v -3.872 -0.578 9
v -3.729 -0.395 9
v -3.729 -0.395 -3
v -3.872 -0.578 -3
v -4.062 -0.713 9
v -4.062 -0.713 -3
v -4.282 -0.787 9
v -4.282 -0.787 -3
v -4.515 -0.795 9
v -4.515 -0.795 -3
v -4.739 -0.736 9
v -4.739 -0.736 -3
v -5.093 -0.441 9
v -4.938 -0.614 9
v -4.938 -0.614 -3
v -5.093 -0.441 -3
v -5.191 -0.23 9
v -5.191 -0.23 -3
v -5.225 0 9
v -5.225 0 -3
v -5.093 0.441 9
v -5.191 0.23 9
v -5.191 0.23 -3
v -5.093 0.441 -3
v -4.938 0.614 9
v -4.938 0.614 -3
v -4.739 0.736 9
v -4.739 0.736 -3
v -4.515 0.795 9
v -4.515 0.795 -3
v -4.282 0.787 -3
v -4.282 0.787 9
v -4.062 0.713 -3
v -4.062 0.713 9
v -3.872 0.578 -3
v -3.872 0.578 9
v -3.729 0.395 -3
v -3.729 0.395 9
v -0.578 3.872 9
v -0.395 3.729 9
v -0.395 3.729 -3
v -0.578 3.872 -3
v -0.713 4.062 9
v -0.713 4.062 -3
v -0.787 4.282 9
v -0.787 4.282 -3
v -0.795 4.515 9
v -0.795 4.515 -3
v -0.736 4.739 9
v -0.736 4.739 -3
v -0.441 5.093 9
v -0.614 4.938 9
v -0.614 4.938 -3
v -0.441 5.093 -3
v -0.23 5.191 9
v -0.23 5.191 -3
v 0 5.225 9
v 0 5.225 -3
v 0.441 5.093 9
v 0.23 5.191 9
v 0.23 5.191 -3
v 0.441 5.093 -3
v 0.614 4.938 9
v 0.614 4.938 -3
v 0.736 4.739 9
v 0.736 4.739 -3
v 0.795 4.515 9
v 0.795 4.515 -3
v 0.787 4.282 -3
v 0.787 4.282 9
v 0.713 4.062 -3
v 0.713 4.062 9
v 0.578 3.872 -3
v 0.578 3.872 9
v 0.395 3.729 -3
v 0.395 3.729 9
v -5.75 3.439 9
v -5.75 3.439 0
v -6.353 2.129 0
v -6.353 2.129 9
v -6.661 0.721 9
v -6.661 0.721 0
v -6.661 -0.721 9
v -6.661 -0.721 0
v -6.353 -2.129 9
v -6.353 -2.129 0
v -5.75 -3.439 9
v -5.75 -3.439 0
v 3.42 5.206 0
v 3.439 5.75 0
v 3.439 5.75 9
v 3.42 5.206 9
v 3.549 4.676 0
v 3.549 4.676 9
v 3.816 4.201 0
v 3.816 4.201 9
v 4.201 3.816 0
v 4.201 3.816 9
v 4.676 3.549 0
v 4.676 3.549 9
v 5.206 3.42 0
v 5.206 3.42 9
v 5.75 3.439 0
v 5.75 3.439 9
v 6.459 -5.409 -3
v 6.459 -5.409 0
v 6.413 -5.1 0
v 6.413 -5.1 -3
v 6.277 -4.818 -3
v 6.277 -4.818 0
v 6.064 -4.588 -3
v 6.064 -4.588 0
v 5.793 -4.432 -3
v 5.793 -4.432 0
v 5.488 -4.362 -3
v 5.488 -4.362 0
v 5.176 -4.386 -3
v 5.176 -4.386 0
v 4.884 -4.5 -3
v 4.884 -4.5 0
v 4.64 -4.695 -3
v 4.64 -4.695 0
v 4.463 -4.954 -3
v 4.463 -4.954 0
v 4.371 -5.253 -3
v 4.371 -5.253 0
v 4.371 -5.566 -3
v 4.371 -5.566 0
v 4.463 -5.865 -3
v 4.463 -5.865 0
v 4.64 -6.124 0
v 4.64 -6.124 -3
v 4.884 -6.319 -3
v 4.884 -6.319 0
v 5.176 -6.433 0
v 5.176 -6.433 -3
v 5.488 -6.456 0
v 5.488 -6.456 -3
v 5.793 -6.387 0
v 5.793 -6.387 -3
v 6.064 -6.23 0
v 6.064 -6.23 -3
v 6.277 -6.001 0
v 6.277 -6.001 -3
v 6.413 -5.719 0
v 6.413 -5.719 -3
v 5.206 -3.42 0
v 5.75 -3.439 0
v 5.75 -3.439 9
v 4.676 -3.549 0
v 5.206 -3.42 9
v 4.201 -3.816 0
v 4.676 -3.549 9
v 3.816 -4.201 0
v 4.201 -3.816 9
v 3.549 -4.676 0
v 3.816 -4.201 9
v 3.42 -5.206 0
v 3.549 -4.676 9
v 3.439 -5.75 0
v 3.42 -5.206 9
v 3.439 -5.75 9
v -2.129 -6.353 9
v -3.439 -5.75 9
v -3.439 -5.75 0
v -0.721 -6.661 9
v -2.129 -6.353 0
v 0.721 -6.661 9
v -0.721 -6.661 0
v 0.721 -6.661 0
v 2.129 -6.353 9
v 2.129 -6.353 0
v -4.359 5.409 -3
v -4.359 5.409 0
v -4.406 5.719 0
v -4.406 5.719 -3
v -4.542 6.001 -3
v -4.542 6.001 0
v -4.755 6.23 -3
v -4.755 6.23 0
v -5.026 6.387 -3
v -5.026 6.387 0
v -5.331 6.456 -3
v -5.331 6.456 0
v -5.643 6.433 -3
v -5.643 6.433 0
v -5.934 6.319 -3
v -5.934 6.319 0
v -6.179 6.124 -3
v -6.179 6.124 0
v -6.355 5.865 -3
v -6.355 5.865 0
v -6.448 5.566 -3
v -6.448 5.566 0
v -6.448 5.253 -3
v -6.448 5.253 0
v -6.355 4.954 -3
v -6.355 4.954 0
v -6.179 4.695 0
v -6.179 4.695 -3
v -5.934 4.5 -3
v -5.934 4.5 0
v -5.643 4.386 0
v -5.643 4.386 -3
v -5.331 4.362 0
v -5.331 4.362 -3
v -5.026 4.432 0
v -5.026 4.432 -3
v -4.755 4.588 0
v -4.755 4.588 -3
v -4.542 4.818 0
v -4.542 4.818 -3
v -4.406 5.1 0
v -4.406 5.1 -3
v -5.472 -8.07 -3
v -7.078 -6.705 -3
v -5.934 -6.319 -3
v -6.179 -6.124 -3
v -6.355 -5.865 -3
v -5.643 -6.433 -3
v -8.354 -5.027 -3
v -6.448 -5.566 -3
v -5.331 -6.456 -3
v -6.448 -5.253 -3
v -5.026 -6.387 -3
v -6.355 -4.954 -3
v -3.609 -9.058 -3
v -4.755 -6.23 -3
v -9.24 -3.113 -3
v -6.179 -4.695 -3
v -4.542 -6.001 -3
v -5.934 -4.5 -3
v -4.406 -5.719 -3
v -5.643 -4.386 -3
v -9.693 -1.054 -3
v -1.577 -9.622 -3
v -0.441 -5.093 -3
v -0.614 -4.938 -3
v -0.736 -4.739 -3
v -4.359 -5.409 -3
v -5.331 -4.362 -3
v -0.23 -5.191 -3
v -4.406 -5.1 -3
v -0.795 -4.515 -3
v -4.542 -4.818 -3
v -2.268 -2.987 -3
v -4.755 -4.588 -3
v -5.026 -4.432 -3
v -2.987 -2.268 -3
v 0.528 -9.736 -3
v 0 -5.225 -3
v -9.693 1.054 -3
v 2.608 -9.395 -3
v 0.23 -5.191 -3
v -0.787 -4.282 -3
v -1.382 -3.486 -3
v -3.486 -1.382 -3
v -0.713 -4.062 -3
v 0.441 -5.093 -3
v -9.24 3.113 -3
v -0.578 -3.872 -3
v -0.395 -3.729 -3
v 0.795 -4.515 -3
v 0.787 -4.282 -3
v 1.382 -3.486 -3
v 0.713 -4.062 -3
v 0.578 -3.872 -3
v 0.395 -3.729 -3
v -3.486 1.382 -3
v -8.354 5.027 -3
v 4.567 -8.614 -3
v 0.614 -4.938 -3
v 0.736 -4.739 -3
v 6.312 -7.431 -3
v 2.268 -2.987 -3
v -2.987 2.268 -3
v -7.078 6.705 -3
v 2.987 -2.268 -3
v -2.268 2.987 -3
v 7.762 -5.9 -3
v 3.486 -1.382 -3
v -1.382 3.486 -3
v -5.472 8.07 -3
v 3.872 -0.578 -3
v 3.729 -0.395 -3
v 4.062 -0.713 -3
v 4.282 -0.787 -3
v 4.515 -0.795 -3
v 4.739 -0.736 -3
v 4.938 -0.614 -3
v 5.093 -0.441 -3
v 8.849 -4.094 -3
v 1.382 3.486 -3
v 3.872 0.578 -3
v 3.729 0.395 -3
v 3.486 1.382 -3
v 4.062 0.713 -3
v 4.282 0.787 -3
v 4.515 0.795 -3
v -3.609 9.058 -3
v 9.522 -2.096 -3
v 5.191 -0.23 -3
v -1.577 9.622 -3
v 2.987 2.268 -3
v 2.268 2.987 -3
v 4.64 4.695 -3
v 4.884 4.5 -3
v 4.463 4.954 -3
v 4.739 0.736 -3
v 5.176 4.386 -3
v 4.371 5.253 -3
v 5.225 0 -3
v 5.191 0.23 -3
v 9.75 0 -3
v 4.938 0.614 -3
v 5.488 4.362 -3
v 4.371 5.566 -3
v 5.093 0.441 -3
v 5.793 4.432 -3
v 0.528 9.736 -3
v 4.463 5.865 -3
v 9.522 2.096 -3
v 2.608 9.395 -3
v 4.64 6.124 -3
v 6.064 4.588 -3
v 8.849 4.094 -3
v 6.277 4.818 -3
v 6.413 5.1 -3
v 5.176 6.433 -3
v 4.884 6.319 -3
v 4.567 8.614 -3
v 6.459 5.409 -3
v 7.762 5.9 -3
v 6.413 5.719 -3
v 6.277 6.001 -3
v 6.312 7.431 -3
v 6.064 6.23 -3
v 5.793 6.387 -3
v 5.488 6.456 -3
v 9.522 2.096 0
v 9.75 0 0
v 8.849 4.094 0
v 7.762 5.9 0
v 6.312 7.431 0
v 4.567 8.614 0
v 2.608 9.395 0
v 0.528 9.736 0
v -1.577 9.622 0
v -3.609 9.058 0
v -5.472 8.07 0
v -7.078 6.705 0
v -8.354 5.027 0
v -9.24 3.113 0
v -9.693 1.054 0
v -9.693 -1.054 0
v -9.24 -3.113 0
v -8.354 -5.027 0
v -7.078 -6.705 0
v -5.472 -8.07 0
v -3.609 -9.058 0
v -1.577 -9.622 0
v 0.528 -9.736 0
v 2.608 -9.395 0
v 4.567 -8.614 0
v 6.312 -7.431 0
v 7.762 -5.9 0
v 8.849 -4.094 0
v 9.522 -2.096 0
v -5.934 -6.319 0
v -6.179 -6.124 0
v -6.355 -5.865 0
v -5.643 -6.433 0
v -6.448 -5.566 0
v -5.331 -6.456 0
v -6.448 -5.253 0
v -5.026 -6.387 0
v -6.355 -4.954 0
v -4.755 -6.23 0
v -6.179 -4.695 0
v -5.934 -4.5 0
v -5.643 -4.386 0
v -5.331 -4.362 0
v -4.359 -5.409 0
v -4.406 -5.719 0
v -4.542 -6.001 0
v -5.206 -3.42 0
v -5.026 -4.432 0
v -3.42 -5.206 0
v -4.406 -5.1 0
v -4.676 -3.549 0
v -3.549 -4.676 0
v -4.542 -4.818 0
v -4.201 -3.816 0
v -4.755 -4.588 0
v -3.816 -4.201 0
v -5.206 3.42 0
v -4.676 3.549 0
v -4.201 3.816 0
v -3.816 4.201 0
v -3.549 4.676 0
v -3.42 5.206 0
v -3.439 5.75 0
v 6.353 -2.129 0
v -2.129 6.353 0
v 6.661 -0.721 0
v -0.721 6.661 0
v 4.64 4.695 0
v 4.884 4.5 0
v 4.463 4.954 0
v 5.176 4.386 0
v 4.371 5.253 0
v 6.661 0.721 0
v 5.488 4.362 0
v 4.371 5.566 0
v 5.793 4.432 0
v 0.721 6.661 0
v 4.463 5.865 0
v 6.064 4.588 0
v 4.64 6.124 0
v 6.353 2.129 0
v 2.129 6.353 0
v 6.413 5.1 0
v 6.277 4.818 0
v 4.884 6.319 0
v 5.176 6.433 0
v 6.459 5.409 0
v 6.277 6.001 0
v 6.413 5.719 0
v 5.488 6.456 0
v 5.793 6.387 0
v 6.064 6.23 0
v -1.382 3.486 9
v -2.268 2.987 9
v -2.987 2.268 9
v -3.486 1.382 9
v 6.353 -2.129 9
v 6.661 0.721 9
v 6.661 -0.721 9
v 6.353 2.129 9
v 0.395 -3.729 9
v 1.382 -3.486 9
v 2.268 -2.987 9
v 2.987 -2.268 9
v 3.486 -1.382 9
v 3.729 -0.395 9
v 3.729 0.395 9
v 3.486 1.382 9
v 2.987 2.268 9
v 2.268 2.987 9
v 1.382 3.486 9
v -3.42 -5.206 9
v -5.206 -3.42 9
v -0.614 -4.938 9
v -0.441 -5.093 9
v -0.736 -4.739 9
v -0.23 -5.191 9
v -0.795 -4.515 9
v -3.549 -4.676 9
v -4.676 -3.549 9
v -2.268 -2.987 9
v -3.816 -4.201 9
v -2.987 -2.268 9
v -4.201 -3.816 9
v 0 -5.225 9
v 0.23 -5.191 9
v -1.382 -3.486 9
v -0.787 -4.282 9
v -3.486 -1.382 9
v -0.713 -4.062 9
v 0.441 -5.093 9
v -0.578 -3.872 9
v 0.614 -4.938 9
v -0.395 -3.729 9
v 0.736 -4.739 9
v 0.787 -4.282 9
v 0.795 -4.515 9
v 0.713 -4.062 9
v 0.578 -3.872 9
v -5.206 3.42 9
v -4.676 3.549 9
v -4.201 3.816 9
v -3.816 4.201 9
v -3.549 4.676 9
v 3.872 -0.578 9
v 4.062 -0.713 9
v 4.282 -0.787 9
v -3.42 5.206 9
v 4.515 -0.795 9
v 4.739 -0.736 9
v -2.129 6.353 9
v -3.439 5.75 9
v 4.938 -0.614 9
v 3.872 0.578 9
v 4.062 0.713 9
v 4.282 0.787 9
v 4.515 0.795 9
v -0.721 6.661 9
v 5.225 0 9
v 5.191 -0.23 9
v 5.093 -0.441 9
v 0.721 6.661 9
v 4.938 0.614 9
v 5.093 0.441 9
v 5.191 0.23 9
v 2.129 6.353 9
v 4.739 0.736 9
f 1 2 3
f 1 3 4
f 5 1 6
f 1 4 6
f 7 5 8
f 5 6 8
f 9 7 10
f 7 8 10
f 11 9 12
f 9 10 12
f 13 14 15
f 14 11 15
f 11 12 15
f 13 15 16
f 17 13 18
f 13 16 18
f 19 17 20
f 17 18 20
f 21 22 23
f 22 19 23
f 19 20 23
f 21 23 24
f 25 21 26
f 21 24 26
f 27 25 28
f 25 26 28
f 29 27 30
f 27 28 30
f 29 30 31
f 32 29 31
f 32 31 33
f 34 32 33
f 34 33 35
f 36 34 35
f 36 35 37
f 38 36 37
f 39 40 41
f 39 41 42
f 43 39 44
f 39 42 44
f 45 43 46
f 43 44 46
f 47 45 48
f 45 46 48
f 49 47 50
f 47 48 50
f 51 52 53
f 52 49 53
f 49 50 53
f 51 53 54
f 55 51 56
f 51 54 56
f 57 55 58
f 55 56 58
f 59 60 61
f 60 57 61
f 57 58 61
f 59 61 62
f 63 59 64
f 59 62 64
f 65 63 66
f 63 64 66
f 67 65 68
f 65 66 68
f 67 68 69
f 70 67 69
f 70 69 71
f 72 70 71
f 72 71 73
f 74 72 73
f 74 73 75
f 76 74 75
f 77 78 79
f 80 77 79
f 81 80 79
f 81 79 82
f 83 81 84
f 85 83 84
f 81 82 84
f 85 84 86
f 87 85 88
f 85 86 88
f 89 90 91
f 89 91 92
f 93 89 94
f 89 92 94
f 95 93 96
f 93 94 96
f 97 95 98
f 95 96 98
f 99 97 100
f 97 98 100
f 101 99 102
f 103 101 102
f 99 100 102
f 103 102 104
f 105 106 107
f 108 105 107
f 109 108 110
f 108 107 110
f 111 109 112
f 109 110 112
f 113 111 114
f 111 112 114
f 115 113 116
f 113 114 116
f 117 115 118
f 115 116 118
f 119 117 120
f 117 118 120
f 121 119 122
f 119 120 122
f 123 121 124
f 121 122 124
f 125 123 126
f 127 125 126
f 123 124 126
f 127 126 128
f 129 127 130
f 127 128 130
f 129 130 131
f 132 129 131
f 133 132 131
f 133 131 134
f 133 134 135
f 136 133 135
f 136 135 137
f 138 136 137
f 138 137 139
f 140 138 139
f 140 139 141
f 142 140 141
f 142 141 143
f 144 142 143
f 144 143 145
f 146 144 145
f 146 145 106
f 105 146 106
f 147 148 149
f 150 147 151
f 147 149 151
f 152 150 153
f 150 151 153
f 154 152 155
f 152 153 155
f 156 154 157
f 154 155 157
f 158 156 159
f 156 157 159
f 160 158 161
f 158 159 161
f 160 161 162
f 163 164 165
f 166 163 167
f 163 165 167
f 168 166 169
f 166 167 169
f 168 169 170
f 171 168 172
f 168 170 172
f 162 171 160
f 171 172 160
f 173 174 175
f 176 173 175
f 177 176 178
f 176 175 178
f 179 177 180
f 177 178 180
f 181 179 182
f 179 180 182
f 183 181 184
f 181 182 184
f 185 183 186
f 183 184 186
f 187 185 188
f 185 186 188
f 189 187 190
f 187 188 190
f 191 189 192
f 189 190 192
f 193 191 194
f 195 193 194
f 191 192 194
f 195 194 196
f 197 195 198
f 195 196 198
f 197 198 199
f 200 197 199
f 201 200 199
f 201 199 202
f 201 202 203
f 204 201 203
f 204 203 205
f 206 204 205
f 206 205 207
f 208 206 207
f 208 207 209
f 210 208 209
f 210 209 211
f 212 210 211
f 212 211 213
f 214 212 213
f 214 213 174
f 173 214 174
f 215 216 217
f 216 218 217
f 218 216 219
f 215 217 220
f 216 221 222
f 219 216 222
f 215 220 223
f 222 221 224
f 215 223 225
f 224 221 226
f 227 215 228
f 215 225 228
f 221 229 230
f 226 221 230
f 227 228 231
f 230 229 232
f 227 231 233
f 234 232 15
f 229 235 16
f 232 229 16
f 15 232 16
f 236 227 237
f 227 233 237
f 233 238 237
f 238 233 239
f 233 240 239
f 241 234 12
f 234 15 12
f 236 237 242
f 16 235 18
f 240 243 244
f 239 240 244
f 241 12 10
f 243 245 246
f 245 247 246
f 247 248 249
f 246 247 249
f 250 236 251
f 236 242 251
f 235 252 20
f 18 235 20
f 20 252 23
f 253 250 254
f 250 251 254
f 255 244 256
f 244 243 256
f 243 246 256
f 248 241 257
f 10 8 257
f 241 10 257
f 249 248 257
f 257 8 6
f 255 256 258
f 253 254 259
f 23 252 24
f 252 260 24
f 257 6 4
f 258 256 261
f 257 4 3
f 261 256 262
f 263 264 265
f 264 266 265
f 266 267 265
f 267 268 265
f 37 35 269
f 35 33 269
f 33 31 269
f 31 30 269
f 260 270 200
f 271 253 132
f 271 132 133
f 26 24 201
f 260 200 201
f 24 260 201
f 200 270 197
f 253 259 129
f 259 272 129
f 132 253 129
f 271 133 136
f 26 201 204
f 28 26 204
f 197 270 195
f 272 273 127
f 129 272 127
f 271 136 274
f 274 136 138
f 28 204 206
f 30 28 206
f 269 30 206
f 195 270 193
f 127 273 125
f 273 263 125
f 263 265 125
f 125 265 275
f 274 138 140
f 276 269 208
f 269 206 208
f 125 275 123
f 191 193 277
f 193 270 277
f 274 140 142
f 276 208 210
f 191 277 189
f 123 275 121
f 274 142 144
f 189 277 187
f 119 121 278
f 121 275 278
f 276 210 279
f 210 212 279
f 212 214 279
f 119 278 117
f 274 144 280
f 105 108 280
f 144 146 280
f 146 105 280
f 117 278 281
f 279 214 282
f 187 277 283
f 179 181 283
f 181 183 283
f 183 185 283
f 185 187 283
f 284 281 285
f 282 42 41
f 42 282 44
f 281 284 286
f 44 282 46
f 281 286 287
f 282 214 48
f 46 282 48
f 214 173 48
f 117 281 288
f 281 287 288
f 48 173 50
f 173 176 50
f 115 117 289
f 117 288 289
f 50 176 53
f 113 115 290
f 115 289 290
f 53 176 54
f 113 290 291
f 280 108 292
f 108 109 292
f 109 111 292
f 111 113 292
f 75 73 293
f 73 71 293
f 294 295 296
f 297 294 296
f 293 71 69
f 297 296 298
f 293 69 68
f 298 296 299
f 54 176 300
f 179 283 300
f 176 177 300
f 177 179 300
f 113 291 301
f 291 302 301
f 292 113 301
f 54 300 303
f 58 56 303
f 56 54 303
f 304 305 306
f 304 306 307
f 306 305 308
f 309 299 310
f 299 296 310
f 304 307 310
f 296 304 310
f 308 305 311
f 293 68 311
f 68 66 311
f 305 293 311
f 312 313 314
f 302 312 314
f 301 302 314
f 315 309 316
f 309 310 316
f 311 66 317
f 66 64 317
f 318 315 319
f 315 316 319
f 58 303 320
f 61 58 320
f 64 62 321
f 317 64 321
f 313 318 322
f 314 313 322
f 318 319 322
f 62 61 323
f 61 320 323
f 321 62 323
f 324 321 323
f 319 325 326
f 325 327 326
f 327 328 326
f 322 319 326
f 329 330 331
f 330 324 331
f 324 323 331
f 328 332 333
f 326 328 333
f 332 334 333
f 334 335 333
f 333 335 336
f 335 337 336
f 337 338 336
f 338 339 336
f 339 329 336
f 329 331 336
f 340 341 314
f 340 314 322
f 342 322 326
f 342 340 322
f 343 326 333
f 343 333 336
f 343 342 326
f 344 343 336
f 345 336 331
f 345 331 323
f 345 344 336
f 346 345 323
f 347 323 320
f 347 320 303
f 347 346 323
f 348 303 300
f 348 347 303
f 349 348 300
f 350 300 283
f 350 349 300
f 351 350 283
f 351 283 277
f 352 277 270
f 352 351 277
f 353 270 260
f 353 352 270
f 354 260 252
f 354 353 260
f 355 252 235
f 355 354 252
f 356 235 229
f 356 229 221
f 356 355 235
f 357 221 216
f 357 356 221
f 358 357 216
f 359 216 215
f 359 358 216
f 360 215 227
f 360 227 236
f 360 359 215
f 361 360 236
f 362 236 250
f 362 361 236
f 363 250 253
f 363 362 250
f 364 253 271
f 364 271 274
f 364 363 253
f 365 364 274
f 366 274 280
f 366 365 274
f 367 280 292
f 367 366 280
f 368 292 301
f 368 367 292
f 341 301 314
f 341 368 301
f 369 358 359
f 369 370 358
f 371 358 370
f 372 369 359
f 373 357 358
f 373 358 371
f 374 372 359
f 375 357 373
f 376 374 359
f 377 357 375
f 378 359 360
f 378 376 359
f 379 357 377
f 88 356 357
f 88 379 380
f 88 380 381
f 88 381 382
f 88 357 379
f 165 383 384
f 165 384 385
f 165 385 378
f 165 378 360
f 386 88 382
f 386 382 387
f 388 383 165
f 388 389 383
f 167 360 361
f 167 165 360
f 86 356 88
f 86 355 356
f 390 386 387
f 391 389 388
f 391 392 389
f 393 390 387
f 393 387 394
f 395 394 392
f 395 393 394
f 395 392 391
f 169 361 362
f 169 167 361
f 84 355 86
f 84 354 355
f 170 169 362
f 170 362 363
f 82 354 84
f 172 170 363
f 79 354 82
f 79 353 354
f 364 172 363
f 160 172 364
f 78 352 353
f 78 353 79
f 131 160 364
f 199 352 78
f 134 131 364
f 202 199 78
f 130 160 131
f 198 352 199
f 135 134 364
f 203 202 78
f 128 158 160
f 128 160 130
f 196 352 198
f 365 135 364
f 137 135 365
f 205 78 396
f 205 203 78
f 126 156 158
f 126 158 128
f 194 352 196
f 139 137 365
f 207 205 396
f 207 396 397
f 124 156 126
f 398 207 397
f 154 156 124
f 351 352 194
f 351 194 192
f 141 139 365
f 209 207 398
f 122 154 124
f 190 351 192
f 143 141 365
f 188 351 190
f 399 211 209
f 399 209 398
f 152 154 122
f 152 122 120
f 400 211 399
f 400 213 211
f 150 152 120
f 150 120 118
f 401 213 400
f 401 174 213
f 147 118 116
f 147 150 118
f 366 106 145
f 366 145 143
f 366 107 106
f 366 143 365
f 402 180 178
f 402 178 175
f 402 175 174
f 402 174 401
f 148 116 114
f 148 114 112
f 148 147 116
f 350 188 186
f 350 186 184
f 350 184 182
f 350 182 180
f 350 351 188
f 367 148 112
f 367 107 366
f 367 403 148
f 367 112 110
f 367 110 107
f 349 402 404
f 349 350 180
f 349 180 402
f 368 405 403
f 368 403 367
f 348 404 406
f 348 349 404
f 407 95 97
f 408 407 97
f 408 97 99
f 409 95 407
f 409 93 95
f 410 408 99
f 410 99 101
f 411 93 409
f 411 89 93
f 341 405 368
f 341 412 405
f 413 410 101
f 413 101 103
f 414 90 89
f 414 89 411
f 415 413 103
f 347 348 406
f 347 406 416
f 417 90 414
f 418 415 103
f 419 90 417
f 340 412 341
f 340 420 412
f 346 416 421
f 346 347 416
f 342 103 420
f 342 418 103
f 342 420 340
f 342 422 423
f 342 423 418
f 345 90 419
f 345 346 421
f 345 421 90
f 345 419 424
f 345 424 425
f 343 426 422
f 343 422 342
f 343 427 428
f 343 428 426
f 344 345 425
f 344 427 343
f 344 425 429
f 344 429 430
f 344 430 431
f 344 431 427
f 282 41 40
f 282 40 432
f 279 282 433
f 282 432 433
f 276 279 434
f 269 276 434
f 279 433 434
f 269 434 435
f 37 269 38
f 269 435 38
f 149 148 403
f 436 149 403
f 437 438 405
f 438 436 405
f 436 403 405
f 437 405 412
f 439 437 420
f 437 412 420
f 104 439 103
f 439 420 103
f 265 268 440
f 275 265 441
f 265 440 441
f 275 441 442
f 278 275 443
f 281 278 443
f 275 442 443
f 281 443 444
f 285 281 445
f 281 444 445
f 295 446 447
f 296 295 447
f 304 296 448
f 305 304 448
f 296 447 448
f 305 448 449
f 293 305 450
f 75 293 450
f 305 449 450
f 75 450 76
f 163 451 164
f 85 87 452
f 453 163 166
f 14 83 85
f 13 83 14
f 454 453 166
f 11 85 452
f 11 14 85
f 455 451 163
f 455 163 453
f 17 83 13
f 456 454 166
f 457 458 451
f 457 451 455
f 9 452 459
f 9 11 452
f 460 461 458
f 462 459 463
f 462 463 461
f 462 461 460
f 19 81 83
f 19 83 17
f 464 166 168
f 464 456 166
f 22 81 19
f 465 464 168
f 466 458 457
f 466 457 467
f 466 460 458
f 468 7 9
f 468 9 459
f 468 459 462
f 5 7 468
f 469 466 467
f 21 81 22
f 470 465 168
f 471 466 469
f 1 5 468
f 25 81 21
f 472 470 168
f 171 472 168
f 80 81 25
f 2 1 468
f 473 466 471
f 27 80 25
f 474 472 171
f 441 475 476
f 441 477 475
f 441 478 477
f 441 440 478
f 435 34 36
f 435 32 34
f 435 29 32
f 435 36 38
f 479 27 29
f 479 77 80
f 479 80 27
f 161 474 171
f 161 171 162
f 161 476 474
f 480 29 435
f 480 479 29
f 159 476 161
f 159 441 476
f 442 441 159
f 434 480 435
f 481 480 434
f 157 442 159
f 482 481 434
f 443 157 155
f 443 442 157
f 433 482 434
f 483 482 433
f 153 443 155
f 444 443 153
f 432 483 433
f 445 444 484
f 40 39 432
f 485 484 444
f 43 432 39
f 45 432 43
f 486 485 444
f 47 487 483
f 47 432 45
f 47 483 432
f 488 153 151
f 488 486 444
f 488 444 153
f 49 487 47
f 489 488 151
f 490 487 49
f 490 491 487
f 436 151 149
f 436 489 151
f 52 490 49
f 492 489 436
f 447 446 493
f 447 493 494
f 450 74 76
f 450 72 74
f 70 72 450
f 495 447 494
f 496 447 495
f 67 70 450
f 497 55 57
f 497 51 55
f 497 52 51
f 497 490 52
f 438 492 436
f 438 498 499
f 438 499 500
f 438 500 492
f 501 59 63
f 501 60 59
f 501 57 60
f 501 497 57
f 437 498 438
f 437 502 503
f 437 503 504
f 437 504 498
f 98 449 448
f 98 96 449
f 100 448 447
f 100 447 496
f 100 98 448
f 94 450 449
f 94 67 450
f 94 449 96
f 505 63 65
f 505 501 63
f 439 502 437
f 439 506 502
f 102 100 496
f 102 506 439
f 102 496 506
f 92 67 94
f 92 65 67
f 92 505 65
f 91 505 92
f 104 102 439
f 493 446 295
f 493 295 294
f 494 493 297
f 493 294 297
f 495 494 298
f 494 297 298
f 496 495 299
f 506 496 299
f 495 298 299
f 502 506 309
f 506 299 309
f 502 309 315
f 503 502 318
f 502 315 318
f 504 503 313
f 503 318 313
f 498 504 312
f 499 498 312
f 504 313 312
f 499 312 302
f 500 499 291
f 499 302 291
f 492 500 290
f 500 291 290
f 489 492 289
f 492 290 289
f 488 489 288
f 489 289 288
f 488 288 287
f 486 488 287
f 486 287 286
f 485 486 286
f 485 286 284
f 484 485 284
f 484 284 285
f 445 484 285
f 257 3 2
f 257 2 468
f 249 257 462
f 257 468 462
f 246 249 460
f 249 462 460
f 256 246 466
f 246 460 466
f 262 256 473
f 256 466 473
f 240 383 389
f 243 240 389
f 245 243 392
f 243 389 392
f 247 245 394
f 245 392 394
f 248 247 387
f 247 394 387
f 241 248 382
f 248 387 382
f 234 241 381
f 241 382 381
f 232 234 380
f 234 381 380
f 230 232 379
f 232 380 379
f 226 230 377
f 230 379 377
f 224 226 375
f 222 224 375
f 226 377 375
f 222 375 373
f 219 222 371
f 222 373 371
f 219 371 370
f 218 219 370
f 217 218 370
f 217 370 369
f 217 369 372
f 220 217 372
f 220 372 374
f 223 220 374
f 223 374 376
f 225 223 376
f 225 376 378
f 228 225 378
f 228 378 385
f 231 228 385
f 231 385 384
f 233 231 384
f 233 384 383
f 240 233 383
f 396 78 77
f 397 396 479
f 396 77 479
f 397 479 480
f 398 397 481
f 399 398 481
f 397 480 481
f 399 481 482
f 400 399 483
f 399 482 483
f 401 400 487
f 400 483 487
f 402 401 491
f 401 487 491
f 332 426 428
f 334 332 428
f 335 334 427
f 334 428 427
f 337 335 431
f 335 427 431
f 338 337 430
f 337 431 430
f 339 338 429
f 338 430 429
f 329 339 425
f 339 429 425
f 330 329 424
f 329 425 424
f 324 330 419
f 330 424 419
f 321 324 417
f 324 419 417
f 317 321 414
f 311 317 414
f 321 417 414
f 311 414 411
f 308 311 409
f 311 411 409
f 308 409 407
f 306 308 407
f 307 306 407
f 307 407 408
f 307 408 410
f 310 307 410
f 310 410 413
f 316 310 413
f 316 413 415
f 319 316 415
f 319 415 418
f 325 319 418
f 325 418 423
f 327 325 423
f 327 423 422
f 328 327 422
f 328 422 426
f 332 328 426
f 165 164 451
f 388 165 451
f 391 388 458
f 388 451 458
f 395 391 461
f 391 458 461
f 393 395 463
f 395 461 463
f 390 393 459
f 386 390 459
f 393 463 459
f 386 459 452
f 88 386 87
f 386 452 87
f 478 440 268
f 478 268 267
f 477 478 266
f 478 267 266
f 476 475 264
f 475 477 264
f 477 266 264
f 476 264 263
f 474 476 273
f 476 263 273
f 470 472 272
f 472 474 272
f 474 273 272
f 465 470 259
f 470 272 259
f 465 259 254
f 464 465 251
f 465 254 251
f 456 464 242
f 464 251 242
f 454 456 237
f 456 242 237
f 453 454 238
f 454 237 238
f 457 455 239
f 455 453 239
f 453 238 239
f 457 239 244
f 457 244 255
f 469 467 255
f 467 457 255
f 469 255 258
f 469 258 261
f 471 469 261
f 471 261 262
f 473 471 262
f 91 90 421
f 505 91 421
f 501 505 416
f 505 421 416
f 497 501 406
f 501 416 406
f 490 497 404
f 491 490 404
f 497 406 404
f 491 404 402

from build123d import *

# Parameters (mm, degrees)
SKIZZE1_R                       = 6.7
SKIZZE1_R_2                     = 3.75
AUFSATZ_LINEAR_AUSTRAGEN1_DEPTH = 9
SKIZZE1_7_R                     = 9.75
SKIZZE1_7_R_2                   = 3.75
AUFSATZ_LINEAR_AUSTRAGEN2_DEPTH = 3
M2_GEWINDEBOHRUNG1_D            = 1.6
SKIZZE5_R                       = 1.05
SCHNITT_LINEAR_AUSTRAGEN1_DEPTH = 13
SKIZZE5_3_R                     = 2
SKIZZE5_3_R_2                   = 1.05
SCHNITT_LINEAR_AUSTRAGEN2_DEPTH = 9


with BuildPart() as part:
    # Skizze1 → Aufsatz-Linear austragen1 (new body)
    with BuildSketch(Plane.XY):
        Circle(SKIZZE1_R)
        Circle(SKIZZE1_R_2, mode=Mode.SUBTRACT)
    extrude(amount=AUFSATZ_LINEAR_AUSTRAGEN1_DEPTH)

    # Skizze1<7> → Aufsatz-Linear austragen2 (add)
    with BuildSketch(Plane.XY):
        Circle(SKIZZE1_7_R)
        Circle(SKIZZE1_7_R_2, mode=Mode.SUBTRACT)
    extrude(amount=-AUFSATZ_LINEAR_AUSTRAGEN2_DEPTH)

    # M2 Gewindebohrung1 (through all)
    with Locations(Plane.XY.offset(9)):
        with Locations((4.425, 0), (0, -4.425), (-4.425, 0), (0, 4.425)):
            Hole(M2_GEWINDEBOHRUNG1_D / 2)

    # Skizze5 → Schnitt-Linear austragen1 (cut, through all)
    with BuildSketch(Plane.XY.offset(9)):
        with Locations((5.409366876, 5.409366876)):
            Circle(SKIZZE5_R)
        with Locations((5.409366876, -5.409366876)):
            Circle(SKIZZE5_R)
        with Locations((-5.409366876, -5.409366876)):
            Circle(SKIZZE5_R)
        with Locations((-5.409366876, 5.409366876)):
            Circle(SKIZZE5_R)
    extrude(amount=-SCHNITT_LINEAR_AUSTRAGEN1_DEPTH, mode=Mode.SUBTRACT)

    # Skizze5<3> → Schnitt-Linear austragen2 (cut)
    with BuildSketch(Plane.XY.offset(9)):
        with Locations((-5.409366876, 5.409366876)):
            Circle(SKIZZE5_3_R)
        with Locations((-5.409366876, 5.409366876)):
            Circle(SKIZZE5_3_R_2, mode=Mode.SUBTRACT)
        with Locations((5.409366876, 5.409366876)):
            Circle(SKIZZE5_3_R)
        with Locations((5.409366876, 5.409366876)):
            Circle(SKIZZE5_3_R_2, mode=Mode.SUBTRACT)
        with Locations((5.409366876, -5.409366876)):
            Circle(SKIZZE5_3_R)
        with Locations((5.409366876, -5.409366876)):
            Circle(SKIZZE5_3_R_2, mode=Mode.SUBTRACT)
        with Locations((-5.409366876, -5.409366876)):
            Circle(SKIZZE5_3_R)
        with Locations((-5.409366876, -5.409366876)):
            Circle(SKIZZE5_3_R_2, mode=Mode.SUBTRACT)
    extrude(amount=-SCHNITT_LINEAR_AUSTRAGEN2_DEPTH, mode=Mode.SUBTRACT)


solid = part.part
